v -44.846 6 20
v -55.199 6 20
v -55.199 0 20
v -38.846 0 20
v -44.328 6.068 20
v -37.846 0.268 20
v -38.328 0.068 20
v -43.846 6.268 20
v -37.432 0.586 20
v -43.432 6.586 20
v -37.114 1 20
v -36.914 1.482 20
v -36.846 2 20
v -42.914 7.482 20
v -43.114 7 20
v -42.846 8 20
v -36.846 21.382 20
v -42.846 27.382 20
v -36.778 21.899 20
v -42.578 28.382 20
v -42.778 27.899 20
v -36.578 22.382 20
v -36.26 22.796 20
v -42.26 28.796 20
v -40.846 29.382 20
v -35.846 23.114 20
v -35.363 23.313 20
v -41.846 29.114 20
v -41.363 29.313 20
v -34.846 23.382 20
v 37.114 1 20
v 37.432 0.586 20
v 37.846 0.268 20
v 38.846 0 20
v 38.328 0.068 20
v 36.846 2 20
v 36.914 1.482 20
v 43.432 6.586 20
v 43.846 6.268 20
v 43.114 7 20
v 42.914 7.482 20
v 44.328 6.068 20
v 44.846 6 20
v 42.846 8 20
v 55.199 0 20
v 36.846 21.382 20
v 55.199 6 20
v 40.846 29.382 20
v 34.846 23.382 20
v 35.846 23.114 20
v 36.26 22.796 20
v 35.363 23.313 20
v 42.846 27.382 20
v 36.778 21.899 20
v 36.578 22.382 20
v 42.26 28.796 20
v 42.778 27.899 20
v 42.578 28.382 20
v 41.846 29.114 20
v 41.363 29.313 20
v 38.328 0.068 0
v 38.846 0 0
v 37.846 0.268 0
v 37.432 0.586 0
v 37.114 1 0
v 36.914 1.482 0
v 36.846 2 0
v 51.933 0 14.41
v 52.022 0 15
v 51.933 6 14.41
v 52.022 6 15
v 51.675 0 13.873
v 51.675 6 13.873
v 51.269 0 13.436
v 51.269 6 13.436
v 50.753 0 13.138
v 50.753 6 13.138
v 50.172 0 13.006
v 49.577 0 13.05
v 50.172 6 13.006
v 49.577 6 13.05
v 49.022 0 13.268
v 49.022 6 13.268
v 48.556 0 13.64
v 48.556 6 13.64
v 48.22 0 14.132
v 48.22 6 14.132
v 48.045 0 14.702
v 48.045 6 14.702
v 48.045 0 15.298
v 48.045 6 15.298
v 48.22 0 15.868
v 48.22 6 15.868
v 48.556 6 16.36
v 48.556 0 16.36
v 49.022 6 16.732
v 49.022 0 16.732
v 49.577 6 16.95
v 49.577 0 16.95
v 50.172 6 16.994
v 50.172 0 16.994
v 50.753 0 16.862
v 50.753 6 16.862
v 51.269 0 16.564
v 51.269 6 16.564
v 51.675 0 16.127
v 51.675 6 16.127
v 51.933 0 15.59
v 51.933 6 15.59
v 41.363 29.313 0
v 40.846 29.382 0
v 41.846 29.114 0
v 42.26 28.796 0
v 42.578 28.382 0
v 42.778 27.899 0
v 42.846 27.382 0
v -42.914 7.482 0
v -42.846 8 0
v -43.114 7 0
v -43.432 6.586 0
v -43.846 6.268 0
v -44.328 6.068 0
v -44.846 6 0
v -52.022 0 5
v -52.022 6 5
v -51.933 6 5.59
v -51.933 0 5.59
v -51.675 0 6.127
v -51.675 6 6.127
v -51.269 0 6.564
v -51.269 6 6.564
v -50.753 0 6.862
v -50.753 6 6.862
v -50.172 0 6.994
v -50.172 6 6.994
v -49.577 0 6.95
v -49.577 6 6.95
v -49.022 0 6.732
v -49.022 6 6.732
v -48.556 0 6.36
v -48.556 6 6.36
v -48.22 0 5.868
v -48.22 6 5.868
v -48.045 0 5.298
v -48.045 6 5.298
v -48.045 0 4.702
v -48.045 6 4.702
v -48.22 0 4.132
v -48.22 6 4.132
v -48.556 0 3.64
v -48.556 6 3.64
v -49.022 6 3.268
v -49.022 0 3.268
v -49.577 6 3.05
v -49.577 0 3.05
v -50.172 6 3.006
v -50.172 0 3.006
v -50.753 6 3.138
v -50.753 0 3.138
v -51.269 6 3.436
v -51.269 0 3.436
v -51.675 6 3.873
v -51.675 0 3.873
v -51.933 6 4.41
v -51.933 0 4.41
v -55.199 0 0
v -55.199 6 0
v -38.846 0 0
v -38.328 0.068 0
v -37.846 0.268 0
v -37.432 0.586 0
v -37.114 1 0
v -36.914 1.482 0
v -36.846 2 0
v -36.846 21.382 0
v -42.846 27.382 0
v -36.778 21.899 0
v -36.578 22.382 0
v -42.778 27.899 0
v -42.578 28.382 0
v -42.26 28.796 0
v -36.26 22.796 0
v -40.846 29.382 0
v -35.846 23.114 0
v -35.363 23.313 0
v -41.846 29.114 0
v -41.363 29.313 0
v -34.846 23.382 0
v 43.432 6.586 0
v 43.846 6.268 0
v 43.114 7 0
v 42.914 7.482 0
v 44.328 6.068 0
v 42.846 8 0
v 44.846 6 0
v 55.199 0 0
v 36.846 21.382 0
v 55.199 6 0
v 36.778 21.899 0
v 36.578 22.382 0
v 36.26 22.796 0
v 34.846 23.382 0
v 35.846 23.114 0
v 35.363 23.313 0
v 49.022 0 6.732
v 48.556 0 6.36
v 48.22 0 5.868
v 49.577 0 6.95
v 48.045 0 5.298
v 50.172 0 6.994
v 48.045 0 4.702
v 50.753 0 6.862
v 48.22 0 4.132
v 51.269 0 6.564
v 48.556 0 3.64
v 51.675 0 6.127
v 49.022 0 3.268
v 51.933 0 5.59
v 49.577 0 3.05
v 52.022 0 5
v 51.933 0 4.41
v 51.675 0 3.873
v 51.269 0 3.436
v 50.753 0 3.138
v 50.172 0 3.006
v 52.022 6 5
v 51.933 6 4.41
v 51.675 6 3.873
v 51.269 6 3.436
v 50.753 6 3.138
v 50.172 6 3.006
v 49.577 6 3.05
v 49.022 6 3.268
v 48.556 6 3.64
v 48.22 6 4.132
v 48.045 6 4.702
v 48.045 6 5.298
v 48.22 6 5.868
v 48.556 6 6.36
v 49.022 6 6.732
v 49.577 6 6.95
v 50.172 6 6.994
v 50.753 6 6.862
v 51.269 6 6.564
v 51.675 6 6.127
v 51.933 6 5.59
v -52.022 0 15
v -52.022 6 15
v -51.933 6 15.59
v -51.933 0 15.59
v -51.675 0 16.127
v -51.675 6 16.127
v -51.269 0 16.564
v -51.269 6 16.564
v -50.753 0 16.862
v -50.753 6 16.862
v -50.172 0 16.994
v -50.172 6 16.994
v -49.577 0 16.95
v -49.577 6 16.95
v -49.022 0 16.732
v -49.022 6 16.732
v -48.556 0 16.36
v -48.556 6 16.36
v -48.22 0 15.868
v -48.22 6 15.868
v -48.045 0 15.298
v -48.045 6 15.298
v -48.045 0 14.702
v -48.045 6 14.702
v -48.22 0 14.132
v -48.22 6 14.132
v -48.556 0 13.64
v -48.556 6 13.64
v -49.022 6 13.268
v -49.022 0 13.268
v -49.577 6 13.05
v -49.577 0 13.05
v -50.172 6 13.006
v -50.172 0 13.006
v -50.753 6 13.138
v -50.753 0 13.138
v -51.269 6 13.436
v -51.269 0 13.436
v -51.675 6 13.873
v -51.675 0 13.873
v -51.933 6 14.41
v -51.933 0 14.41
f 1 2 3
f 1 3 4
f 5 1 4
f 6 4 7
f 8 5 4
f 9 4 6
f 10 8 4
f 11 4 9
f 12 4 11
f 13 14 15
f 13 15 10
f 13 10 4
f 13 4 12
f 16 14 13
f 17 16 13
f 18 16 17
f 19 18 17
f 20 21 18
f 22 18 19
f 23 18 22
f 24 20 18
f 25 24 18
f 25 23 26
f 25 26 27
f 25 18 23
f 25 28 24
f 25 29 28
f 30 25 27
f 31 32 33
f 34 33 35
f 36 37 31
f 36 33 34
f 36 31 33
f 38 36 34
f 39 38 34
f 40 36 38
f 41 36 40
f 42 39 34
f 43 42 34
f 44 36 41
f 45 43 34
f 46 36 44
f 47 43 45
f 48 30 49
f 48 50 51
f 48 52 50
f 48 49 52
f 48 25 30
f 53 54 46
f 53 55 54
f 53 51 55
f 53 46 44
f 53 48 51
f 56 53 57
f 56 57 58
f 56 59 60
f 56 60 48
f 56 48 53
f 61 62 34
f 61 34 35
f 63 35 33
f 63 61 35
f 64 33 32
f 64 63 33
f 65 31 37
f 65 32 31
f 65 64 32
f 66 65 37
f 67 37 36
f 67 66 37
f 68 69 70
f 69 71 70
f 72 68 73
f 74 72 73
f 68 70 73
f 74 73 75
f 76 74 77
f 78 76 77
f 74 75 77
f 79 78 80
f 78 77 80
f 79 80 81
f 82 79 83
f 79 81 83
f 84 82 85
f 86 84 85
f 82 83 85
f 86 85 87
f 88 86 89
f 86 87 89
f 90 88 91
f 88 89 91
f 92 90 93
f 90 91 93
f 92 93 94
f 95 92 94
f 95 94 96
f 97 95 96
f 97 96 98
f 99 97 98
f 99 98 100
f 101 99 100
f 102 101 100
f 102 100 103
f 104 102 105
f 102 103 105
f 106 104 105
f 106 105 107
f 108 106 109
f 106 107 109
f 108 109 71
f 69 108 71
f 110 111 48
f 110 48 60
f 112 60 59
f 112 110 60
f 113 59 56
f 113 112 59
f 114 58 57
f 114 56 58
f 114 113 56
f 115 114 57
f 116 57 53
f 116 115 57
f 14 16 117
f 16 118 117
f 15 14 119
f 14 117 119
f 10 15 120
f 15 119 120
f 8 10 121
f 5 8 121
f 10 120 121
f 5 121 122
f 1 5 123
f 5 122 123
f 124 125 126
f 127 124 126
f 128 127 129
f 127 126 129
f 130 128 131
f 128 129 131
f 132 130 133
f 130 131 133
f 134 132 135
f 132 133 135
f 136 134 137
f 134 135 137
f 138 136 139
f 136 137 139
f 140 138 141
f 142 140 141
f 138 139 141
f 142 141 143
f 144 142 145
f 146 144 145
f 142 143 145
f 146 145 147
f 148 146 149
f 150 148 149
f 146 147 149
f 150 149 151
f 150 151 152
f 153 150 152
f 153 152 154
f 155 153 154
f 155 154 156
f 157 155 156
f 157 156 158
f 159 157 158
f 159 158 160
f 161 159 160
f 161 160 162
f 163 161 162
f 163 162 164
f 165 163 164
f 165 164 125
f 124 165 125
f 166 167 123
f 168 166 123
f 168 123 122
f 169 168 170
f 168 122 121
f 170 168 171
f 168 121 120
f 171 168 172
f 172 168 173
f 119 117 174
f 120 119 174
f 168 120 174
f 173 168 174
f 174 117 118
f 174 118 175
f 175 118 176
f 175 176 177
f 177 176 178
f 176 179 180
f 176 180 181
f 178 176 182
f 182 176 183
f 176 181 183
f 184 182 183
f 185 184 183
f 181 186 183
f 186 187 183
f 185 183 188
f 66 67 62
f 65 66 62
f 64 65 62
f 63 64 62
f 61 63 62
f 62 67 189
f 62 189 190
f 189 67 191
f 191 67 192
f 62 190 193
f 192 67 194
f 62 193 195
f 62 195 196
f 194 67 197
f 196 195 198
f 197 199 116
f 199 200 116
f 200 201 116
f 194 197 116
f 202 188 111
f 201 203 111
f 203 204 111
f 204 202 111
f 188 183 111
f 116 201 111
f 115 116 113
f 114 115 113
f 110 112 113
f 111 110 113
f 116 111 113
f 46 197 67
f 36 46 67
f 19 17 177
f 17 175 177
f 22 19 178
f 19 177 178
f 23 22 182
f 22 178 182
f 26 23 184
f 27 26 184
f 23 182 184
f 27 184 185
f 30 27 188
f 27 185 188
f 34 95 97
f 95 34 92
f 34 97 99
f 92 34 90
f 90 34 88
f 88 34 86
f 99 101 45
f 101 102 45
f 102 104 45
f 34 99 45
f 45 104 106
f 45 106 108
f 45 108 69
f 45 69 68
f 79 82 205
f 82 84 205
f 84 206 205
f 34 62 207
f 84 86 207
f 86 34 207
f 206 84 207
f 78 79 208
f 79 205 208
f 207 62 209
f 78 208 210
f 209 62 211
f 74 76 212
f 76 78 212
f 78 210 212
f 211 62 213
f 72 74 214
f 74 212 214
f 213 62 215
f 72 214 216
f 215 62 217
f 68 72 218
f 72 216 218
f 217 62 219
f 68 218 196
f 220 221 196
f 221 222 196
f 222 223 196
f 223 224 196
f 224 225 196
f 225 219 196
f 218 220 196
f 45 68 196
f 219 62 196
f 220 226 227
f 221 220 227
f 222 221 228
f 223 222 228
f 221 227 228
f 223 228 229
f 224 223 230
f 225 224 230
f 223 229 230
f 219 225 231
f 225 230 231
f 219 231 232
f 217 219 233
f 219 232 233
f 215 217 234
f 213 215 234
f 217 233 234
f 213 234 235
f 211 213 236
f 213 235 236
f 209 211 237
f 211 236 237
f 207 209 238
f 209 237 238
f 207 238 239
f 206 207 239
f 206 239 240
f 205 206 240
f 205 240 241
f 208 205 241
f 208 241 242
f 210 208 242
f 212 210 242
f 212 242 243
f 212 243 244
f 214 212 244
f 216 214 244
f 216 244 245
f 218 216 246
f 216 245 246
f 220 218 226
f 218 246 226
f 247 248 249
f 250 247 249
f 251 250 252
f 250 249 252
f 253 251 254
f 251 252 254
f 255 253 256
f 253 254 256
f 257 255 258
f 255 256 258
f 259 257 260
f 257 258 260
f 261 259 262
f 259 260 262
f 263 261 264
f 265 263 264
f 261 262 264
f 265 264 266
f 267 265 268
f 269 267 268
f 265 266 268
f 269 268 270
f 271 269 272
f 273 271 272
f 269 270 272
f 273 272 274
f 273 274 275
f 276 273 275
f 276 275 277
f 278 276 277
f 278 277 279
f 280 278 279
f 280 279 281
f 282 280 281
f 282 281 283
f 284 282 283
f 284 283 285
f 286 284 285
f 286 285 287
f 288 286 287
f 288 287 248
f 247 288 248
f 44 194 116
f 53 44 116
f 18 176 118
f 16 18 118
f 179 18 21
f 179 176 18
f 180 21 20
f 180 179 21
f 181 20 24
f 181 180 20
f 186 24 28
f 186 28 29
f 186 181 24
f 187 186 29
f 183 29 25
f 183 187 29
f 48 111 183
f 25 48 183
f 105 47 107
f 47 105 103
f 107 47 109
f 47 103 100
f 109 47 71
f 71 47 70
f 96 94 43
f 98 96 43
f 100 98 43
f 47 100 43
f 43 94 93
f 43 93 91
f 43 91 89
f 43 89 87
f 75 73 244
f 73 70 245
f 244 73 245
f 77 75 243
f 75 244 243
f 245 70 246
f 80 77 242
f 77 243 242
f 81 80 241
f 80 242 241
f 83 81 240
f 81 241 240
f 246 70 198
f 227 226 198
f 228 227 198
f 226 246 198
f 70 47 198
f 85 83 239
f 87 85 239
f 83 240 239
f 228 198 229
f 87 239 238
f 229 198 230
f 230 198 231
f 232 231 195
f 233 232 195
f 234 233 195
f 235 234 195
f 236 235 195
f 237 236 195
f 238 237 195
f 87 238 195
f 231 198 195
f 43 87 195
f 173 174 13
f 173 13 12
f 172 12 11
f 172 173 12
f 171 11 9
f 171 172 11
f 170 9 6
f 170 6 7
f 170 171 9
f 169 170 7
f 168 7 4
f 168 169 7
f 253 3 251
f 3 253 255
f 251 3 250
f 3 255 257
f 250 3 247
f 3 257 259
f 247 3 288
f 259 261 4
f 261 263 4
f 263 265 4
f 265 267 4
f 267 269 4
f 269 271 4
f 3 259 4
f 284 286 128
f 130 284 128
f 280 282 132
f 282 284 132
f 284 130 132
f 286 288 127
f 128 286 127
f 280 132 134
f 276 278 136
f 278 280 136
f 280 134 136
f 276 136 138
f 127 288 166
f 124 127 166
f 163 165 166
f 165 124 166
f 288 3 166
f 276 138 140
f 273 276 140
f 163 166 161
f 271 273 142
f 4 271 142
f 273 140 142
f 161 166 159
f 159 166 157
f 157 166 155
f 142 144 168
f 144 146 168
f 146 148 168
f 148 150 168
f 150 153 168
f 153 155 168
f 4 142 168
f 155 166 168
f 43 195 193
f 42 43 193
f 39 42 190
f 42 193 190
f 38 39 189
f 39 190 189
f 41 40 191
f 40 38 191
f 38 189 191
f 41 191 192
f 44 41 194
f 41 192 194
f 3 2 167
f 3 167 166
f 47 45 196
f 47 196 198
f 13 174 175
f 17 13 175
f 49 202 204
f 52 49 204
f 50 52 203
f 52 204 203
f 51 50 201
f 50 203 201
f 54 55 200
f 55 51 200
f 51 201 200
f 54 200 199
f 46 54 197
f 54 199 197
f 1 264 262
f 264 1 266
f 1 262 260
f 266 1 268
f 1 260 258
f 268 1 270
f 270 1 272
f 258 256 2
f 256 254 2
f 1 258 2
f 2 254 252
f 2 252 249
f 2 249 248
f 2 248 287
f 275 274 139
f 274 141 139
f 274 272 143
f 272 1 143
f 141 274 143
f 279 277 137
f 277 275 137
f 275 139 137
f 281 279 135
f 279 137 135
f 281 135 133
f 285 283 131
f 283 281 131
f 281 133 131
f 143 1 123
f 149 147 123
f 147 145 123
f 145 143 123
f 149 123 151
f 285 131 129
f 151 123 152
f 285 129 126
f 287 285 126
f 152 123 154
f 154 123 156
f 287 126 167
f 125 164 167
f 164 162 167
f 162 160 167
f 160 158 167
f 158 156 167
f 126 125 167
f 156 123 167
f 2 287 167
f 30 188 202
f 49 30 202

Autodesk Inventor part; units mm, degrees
ref_plane "YZ Plane" through (0, 0, 0) normal (1, 0, 0) x (0, 1, 0)
ref_plane "XZ Plane" through (0, 0, 0) normal (0, 1, 0) x (-1, 0, 0)
ref_plane "XY Plane" through (0, 0, 0) normal (0, 0, 1) x (1, 0, 0)
sketch "Sketch1" plane through (0, 0, 0) normal (0, 0, 1) x (1, 0, 0)
  line L0 (0, 23.3816) -> (34.8458, 23.3816)
  line L1 (36.8458, 21.3816) -> (36.8458, 2)
  line L2 (38.8458, 0) -> (55.1987, 0)
  line L3 (55.1987, 0) -> (55.1987, 6)
  line L4 (55.1987, 6) -> (44.8458, 6)
  line L5 (42.8458, 8) -> (42.8458, 27.3816)
  line L6 (40.8458, 29.3816) -> (0, 29.3816)
  arc A0 (42.8458, 8) -> (44.8458, 6) centre (44.8458, 8) ccw
  arc A1 (36.8458, 2) -> (38.8458, 0) centre (38.8458, 2) ccw
  arc A2 (36.8458, 21.3816) -> (34.8458, 23.3816) centre (34.8458, 21.3816) ccw
  arc A3 (42.8458, 27.3816) -> (40.8458, 29.3816) centre (40.8458, 27.3816) ccw
  line L7 (0, 23.3816) -> (0, 29.3816)
  point P0 (0, 0)
  dimension "d0" = 6
  dimension "d1" = 6
  dimension "d2" = 6
  dimension "d3" = 2
extrude "Extrusion1" add sketch "Sketch1" along normal blind 20
sketch "Sketch2" plane through (44.8458, 6, 0) normal (0, 1, 0) x (1, 0, 0)
  line L0 (10.3529, -20) -> (0, -20) construction
  line L1 (5.1765, -20) -> (5.1765, -15) construction
  line L2 (5.1765, -15) -> (5.1765, -5) construction
  circle A0 centre (5.1765, -15) radius 2
  circle A1 centre (5.1765, -5) radius 2
  point P0 (-44.8458, 0)
  dimension "d7" = 10
  dimension "d8" = 5
  dimension "d9" = 4
  dimension "d10" = 4
extrude "Extrusion2" cut sketch "Sketch2" against normal blind 20
mirror "Mirror1" about plane through (0, 29.3816, 0) normal (-1, 0, 0) of "Extrusion1", "Extrusion2"
properties part number "poigne"
